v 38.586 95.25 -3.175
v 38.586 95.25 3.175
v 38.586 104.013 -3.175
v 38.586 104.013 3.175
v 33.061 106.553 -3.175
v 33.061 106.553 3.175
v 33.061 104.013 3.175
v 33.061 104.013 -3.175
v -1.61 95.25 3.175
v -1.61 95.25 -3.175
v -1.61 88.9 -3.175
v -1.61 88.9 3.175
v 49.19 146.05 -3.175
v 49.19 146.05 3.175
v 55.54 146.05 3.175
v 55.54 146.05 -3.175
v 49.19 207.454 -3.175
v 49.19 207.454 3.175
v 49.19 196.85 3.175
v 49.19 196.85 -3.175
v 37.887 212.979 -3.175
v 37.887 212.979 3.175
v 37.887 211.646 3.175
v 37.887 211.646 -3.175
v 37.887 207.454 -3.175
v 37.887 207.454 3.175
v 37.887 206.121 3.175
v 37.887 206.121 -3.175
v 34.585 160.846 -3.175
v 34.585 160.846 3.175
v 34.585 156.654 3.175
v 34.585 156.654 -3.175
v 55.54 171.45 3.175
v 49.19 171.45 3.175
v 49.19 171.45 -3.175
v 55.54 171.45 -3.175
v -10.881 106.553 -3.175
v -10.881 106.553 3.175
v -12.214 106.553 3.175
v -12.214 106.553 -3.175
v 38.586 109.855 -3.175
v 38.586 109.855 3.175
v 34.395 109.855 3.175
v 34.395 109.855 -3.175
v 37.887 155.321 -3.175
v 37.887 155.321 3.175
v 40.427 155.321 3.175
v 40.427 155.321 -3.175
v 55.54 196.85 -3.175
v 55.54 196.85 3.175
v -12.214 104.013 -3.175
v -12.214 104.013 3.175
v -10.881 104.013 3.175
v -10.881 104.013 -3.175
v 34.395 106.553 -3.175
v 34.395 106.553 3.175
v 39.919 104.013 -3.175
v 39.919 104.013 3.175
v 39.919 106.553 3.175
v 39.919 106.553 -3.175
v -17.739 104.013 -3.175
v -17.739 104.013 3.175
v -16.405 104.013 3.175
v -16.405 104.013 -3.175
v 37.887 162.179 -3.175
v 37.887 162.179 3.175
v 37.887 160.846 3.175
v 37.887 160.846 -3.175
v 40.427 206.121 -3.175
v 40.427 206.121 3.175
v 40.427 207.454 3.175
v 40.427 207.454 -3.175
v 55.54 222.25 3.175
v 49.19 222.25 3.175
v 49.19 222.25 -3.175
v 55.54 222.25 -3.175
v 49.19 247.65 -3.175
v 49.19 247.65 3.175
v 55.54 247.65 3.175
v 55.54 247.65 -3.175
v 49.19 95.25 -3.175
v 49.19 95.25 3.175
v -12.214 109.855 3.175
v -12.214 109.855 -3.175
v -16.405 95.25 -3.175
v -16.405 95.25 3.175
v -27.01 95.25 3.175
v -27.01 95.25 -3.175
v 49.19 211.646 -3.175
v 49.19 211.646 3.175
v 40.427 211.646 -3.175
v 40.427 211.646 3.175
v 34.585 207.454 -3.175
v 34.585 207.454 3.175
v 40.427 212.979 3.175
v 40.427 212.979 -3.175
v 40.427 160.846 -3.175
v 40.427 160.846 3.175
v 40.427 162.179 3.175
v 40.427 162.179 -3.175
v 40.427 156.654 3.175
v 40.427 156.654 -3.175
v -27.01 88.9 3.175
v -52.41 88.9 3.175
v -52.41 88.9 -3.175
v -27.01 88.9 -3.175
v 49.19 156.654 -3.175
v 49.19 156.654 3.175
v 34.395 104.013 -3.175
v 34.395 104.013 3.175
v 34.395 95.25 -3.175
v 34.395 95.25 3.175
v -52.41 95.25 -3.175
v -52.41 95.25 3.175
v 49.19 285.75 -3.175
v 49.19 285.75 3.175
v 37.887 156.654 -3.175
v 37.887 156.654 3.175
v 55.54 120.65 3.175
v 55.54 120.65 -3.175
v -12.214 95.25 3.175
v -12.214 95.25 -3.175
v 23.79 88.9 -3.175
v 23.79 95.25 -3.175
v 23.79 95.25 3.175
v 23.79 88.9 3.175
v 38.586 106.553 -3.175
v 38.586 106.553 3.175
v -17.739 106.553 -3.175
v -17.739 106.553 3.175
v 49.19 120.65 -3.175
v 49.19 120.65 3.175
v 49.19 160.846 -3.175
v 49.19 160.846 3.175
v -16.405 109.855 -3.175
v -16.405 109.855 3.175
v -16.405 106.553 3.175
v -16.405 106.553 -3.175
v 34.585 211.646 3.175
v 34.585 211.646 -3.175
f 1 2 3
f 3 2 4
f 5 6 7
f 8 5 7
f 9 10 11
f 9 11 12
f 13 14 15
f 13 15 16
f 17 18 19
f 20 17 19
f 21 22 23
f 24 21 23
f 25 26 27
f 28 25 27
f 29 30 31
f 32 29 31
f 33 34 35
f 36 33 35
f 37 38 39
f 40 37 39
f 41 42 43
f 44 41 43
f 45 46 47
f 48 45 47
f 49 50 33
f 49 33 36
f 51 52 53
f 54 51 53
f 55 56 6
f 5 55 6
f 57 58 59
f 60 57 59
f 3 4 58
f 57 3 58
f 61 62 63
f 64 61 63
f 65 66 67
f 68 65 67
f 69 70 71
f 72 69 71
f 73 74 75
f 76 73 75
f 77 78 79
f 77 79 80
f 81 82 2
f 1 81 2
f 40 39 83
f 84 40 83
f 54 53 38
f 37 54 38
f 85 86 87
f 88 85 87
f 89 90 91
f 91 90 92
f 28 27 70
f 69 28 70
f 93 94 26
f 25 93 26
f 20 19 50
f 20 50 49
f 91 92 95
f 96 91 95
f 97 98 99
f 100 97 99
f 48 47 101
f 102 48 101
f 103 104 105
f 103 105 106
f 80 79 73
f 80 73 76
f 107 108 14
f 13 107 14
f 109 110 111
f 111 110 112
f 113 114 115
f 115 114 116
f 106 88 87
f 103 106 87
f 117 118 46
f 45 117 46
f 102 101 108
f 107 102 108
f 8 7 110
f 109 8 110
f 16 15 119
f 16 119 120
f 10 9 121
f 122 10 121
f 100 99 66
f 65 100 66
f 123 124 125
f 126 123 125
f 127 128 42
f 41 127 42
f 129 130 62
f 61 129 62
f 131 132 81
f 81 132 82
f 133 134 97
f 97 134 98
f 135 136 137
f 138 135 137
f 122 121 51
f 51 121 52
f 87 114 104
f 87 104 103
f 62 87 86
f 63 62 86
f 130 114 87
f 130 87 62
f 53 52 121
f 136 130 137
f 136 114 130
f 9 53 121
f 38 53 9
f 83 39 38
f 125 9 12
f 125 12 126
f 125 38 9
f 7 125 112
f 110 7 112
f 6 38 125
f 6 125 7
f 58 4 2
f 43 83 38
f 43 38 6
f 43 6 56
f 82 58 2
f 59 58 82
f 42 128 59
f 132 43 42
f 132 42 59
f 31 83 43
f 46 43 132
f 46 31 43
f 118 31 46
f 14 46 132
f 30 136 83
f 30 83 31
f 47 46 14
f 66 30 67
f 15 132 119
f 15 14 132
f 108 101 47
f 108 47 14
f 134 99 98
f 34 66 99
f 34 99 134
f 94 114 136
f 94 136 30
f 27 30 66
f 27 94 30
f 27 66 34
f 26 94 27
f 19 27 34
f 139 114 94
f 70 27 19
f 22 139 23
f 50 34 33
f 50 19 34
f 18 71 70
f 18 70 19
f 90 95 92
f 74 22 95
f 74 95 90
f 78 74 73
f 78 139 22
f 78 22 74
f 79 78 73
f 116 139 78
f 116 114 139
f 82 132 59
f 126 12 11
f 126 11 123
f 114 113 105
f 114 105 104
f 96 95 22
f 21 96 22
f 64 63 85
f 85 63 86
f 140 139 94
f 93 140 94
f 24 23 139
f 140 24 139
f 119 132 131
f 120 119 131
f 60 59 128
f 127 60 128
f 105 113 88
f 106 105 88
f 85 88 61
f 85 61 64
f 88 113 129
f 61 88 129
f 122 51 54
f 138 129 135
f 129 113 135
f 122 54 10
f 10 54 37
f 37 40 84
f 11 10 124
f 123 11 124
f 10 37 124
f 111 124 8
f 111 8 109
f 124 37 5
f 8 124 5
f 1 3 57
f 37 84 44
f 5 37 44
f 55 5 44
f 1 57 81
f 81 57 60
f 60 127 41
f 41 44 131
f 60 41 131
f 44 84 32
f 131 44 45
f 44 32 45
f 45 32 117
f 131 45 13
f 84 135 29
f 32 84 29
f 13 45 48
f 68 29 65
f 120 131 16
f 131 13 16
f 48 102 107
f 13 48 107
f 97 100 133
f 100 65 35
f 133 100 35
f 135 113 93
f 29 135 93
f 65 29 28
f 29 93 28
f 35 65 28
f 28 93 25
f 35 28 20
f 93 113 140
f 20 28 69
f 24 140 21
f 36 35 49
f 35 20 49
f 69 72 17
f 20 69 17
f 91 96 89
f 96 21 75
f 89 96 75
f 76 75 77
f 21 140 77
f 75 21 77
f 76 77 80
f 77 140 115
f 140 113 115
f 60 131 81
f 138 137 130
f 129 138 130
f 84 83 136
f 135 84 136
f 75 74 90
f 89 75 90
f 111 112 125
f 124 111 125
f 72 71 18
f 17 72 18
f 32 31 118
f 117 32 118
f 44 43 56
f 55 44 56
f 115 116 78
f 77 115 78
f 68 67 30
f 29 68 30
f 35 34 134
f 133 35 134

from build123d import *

# Parameters (mm, degrees)
BOSS_EXTRUDE1_DEPTH = 3.175
SKETCH2_W           = 6.35
SKETCH2_H           = 25.4
BOSS_EXTRUDE2_DEPTH = 6.35
LPATTERN1_COUNT     = 3
LPATTERN1_PITCH     = 50.8
SKETCH3_W           = 25.4
SKETCH3_H           = 6.35
BOSS_EXTRUDE3_DEPTH = 6.35
LPATTERN2_COUNT     = 2
LPATTERN2_PITCH     = 50.8
CUT_EXTRUDE1_DEPTH  = 292.166765647


with BuildPart() as part:
    # Sketch1 → Boss-Extrude1 (new, symmetric)
    with BuildSketch(Plane.XY):
        Polygon((49.19007938, 285.75), (49.19007938, 95.25), (-52.40992062, 95.25), align=None)
    extrude(amount=BOSS_EXTRUDE1_DEPTH, both=True)

    # Sketch2 → Boss-Extrude2 (add)
    with BuildSketch(Plane(origin=(49.19007938, 0, 0), x_dir=(0, 0, -1), z_dir=(1, 0, 0))):
        with Locations((0, 133.35)):
            Rectangle(SKETCH2_W, SKETCH2_H)
    boss_extrude2 = extrude(amount=BOSS_EXTRUDE2_DEPTH)

    # LPattern1: Boss-Extrude2 ×3
    with Locations(*[(0, i * LPATTERN1_PITCH, 0) for i in range(1, LPATTERN1_COUNT)]):
        add(boss_extrude2)

    # Sketch3 → Boss-Extrude3 (add)
    with BuildSketch(Plane.XZ.offset(-95.25)):
        with Locations((11.09007938, 0)):
            Rectangle(SKETCH3_W, SKETCH3_H)
    boss_extrude3 = extrude(amount=BOSS_EXTRUDE3_DEPTH)

    # LPattern2: Boss-Extrude3 ×2
    with Locations(*[(-i * LPATTERN2_PITCH, 0, 0) for i in range(1, LPATTERN2_COUNT)]):
        add(boss_extrude3)

    # Sketch4 → Cut-Extrude1 (cut, through all)
    with BuildSketch(Plane.XY.offset(3.175)):
        Polygon((49.19007938, 156.6545), (49.19007938, 160.8455), (40.42707938, 160.8455), (40.42707938, 162.179), (37.88707938, 162.179), (37.88707938, 160.8455), (34.58507938, 160.8455), (34.58507938, 156.6545), (37.88707938, 156.6545), (37.88707938, 155.321), (40.42707938, 155.321), (40.42707938, 156.6545), align=None)
        Polygon((-16.40542062, 95.25), (-12.21442062, 95.25), (-12.21442062, 104.013), (-10.88092062, 104.013), (-10.88092062, 106.553), (-12.21442062, 106.553), (-12.21442062, 109.855), (-16.40542062, 109.855), (-16.40542062, 106.553), (-17.73892062, 106.553), (-17.73892062, 104.013), (-16.40542062, 104.013), align=None)
        Polygon((49.19007938, 207.4545), (49.19007938, 211.6455), (40.42707938, 211.6455), (40.42707938, 212.979), (37.88707938, 212.979), (37.88707938, 211.6455), (34.58507938, 211.6455), (34.58507938, 207.4545), (37.88707938, 207.4545), (37.88707938, 206.121), (40.42707938, 206.121), (40.42707938, 207.4545), align=None)
        Polygon((34.39457938, 95.25), (38.58557938, 95.25), (38.58557938, 104.013), (39.91907938, 104.013), (39.91907938, 106.553), (38.58557938, 106.553), (38.58557938, 109.855), (34.39457938, 109.855), (34.39457938, 106.553), (33.06107938, 106.553), (33.06107938, 104.013), (34.39457938, 104.013), align=None)
    extrude(amount=-CUT_EXTRUDE1_DEPTH, mode=Mode.SUBTRACT)


solid = part.part
